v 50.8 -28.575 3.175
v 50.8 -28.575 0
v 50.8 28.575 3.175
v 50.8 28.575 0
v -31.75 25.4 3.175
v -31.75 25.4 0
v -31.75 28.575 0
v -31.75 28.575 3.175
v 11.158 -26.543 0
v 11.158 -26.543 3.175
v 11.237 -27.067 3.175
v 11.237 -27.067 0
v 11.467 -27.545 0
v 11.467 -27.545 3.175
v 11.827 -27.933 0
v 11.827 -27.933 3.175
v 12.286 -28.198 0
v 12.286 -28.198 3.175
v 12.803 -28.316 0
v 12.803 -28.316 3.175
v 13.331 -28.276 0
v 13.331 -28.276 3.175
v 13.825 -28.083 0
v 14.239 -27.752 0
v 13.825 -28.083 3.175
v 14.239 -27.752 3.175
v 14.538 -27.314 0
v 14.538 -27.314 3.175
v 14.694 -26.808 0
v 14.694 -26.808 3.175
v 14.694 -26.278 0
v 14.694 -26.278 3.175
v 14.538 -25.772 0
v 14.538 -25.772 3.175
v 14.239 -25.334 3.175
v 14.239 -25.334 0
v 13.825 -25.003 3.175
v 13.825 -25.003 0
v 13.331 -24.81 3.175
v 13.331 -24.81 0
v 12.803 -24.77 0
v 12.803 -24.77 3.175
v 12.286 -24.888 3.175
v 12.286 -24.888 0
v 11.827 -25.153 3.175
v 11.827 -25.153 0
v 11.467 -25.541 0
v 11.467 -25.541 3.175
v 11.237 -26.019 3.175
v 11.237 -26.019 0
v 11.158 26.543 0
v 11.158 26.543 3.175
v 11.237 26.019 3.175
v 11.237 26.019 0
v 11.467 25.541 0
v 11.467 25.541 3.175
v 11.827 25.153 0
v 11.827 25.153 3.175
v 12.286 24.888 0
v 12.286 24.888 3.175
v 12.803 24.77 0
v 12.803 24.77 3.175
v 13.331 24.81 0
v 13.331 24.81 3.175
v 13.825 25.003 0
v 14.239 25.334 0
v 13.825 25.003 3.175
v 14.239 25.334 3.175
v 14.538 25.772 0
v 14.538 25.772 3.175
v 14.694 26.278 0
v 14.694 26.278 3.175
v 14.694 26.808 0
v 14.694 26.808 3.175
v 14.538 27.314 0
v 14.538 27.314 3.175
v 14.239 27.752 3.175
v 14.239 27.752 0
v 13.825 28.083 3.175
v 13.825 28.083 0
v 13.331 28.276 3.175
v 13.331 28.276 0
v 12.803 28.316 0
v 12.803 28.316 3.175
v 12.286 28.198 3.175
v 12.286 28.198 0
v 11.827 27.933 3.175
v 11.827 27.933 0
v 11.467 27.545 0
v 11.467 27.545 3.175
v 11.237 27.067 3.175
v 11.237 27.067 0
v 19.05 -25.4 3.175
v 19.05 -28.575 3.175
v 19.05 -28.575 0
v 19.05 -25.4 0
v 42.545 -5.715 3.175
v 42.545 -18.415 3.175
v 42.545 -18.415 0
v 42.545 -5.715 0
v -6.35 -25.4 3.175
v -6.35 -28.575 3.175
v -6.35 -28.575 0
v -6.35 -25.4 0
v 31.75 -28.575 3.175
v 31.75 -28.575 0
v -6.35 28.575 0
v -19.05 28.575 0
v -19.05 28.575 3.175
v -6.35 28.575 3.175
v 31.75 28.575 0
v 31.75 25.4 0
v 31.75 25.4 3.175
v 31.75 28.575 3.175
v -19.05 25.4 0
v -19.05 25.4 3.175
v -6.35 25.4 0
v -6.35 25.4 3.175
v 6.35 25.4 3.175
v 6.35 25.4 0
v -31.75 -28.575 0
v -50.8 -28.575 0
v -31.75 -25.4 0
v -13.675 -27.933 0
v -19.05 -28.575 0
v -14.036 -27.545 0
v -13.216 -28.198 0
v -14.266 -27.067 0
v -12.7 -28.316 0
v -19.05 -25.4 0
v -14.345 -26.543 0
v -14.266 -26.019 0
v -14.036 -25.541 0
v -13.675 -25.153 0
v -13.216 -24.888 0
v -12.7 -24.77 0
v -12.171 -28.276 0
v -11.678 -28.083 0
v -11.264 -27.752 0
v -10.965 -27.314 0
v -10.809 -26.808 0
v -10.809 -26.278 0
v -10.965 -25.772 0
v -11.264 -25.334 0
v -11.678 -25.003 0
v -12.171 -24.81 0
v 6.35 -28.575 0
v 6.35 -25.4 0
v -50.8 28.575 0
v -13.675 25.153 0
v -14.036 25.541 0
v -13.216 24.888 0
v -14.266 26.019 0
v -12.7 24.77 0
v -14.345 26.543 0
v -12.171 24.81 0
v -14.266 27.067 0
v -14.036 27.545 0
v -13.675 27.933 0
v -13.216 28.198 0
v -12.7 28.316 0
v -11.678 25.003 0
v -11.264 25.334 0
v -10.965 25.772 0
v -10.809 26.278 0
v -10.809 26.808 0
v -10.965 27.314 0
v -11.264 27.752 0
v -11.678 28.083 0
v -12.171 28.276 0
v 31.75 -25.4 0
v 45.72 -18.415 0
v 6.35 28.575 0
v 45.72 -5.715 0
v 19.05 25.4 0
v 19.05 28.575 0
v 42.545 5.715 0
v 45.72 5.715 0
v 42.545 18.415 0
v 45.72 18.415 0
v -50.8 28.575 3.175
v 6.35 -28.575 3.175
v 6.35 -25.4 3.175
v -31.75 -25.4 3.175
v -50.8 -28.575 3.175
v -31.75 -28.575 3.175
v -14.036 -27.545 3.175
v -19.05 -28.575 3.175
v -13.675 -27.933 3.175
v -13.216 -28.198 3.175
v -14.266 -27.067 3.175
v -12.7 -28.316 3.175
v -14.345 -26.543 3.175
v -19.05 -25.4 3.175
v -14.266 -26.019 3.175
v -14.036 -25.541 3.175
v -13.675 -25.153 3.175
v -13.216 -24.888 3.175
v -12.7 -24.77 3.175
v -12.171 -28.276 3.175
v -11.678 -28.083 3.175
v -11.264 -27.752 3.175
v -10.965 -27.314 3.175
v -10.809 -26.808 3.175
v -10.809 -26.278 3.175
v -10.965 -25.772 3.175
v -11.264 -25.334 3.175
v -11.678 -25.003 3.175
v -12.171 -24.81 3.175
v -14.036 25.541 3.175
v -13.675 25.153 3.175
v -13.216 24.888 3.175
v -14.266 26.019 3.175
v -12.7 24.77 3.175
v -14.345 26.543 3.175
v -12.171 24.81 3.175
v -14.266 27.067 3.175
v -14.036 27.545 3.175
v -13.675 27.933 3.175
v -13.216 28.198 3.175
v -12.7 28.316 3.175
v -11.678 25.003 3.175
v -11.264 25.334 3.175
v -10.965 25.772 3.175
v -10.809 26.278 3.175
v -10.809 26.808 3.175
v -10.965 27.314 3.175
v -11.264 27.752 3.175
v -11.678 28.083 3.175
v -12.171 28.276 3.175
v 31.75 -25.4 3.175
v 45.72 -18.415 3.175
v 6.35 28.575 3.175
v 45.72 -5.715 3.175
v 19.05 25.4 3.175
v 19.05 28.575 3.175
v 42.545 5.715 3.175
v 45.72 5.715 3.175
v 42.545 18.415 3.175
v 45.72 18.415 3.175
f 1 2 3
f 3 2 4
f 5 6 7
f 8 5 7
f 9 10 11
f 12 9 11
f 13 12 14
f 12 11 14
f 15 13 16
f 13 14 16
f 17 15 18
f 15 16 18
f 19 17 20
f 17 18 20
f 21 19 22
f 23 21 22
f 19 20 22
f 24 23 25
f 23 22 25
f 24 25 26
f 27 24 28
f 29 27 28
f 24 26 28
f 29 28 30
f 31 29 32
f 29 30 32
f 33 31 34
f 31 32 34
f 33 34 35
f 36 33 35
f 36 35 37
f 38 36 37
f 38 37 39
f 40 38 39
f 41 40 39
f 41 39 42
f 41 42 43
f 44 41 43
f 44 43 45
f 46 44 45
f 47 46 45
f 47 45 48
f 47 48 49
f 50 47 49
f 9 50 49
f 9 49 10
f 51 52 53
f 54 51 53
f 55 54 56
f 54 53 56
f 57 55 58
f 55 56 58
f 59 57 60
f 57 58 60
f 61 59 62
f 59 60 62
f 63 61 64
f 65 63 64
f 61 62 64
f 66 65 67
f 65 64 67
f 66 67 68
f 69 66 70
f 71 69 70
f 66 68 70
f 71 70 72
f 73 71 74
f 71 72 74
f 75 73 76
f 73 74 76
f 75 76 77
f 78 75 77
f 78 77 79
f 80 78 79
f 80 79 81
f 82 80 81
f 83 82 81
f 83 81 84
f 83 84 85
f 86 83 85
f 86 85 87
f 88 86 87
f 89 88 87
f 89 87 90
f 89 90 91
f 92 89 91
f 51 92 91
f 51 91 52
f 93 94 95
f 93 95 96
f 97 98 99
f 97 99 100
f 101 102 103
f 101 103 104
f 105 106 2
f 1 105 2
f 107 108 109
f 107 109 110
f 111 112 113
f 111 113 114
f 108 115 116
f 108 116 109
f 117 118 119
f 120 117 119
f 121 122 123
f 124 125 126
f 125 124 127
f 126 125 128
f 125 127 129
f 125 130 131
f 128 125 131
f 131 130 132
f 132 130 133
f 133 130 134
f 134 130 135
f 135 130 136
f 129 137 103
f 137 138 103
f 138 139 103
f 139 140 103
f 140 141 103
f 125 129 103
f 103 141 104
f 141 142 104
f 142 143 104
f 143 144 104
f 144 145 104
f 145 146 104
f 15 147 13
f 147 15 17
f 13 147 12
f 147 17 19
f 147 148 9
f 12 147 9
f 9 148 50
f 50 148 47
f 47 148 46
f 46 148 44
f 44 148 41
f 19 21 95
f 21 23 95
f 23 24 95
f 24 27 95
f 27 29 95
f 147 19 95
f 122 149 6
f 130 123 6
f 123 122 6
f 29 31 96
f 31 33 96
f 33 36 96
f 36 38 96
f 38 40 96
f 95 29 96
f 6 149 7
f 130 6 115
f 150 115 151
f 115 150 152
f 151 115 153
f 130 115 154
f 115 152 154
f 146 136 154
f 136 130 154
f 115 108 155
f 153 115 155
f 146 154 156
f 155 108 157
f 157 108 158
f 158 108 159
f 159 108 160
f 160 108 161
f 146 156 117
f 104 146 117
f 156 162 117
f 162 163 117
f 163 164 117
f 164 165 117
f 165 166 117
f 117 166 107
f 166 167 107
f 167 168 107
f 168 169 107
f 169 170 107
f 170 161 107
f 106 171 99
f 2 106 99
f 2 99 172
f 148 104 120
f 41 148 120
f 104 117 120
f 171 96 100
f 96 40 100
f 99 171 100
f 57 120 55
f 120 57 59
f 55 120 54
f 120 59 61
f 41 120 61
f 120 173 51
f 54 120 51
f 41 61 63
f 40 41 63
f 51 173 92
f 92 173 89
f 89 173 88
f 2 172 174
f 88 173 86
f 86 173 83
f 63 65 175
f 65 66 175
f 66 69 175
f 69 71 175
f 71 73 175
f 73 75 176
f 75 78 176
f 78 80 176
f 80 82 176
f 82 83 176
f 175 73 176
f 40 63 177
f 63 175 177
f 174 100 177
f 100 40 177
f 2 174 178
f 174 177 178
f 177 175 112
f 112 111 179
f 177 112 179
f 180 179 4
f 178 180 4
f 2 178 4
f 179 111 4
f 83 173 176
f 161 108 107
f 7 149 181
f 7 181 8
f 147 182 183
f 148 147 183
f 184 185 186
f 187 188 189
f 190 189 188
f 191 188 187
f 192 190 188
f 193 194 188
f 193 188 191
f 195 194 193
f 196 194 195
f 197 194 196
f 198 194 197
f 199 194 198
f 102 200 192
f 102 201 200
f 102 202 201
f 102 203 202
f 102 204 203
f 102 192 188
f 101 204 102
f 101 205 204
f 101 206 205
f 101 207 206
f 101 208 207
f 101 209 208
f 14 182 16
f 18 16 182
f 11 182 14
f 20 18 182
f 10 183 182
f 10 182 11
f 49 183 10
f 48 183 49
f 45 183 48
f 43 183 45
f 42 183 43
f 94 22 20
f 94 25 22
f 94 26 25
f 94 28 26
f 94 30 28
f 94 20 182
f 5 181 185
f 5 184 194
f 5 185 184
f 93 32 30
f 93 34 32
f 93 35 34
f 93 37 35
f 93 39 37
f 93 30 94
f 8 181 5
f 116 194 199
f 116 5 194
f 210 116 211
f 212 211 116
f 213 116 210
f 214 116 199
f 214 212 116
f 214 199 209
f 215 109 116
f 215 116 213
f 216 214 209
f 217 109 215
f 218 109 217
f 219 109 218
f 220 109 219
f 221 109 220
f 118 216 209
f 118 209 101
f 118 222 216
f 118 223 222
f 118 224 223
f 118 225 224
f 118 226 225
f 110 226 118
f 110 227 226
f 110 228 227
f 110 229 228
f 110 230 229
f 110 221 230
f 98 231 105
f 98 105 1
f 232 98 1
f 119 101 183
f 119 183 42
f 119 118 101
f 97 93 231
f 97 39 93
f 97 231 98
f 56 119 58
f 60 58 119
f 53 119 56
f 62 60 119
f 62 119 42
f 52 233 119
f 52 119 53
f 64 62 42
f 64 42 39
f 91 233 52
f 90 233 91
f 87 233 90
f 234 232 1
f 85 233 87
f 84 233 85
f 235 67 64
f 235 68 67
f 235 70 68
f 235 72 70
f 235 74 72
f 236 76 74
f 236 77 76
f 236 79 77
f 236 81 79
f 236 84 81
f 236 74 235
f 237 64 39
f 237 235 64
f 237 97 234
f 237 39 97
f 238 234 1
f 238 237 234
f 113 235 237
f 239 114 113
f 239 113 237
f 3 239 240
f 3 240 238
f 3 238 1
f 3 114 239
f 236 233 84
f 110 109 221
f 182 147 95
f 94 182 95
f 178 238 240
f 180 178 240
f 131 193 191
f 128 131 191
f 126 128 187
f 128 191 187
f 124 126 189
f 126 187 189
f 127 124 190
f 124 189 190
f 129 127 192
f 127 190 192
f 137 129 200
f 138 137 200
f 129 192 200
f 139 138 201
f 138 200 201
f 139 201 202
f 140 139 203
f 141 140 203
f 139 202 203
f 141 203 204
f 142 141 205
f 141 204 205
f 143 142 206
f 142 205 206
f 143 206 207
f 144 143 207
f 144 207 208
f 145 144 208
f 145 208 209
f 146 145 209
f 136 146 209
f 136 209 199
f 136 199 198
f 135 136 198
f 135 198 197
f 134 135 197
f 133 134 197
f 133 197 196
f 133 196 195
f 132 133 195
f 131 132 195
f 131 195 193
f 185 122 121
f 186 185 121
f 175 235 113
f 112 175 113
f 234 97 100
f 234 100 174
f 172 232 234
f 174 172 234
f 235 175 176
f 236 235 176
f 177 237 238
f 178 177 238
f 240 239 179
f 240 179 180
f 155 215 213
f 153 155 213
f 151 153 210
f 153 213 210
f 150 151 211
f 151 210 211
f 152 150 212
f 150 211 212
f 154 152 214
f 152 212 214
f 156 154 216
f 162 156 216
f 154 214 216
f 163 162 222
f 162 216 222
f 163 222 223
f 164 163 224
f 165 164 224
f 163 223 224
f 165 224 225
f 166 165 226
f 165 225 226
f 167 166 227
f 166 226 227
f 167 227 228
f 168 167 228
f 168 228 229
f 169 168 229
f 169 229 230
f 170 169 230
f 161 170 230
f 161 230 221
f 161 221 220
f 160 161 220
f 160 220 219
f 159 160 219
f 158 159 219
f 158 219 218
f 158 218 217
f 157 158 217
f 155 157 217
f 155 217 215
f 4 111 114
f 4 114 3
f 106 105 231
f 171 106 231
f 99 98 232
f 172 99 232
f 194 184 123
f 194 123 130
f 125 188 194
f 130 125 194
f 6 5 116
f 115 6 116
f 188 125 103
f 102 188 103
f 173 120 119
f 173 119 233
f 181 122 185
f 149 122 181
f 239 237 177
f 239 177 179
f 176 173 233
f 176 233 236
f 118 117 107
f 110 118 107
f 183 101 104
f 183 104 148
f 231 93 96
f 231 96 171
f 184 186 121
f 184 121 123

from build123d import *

# Parameters (mm, degrees)
F0_W     = 101.6
F0_H     = 57.15
F1_DEPTH = 3.175
F2_W     = 12.7
F2_H     = 3.175
F2_W_2   = 3.175
F2_H_2   = 12.7
F3_DEPTH = 3.176
F5_D     = 3.556


with BuildPart() as f1:
    # F0 (on Top) → F1 (new body)
    with BuildSketch(Plane.XY):
        Rectangle(F0_W, F0_H)
    extrude(amount=F1_DEPTH)

    # F2 (on face) → F3 (cut, through all)
    with BuildSketch(Plane.XY.offset(3.175)):
        with Locations((-25.4, -26.9875)):
            Rectangle(F2_W, F2_H)
        with Locations((0, -26.9875)):
            Rectangle(F2_W, F2_H)
        with Locations((25.4, -26.9875)):
            Rectangle(F2_W, F2_H)
        with Locations((44.1325, -12.065)):
            Rectangle(F2_W_2, F2_H_2)
        with Locations((44.1325, 12.065)):
            Rectangle(F2_W_2, F2_H_2)
        with Locations((-25.4, 26.9875)):
            Rectangle(F2_W, F2_H)
        with Locations((0, 26.9875)):
            Rectangle(F2_W, F2_H)
        with Locations((25.4, 26.9875)):
            Rectangle(F2_W, F2_H)
    extrude(amount=-F3_DEPTH, mode=Mode.SUBTRACT)

    # F5 (through all)
    with Locations(Plane(origin=(0, 0, 0), x_dir=(1, 0, 0), z_dir=(0, 0, -1))):
        with Locations((-12.566888, 26.543), (12.935686, 26.543), (-12.566888, -26.543), (12.935686, -26.543)):
            Hole(F5_D / 2)


solid = f1.part
